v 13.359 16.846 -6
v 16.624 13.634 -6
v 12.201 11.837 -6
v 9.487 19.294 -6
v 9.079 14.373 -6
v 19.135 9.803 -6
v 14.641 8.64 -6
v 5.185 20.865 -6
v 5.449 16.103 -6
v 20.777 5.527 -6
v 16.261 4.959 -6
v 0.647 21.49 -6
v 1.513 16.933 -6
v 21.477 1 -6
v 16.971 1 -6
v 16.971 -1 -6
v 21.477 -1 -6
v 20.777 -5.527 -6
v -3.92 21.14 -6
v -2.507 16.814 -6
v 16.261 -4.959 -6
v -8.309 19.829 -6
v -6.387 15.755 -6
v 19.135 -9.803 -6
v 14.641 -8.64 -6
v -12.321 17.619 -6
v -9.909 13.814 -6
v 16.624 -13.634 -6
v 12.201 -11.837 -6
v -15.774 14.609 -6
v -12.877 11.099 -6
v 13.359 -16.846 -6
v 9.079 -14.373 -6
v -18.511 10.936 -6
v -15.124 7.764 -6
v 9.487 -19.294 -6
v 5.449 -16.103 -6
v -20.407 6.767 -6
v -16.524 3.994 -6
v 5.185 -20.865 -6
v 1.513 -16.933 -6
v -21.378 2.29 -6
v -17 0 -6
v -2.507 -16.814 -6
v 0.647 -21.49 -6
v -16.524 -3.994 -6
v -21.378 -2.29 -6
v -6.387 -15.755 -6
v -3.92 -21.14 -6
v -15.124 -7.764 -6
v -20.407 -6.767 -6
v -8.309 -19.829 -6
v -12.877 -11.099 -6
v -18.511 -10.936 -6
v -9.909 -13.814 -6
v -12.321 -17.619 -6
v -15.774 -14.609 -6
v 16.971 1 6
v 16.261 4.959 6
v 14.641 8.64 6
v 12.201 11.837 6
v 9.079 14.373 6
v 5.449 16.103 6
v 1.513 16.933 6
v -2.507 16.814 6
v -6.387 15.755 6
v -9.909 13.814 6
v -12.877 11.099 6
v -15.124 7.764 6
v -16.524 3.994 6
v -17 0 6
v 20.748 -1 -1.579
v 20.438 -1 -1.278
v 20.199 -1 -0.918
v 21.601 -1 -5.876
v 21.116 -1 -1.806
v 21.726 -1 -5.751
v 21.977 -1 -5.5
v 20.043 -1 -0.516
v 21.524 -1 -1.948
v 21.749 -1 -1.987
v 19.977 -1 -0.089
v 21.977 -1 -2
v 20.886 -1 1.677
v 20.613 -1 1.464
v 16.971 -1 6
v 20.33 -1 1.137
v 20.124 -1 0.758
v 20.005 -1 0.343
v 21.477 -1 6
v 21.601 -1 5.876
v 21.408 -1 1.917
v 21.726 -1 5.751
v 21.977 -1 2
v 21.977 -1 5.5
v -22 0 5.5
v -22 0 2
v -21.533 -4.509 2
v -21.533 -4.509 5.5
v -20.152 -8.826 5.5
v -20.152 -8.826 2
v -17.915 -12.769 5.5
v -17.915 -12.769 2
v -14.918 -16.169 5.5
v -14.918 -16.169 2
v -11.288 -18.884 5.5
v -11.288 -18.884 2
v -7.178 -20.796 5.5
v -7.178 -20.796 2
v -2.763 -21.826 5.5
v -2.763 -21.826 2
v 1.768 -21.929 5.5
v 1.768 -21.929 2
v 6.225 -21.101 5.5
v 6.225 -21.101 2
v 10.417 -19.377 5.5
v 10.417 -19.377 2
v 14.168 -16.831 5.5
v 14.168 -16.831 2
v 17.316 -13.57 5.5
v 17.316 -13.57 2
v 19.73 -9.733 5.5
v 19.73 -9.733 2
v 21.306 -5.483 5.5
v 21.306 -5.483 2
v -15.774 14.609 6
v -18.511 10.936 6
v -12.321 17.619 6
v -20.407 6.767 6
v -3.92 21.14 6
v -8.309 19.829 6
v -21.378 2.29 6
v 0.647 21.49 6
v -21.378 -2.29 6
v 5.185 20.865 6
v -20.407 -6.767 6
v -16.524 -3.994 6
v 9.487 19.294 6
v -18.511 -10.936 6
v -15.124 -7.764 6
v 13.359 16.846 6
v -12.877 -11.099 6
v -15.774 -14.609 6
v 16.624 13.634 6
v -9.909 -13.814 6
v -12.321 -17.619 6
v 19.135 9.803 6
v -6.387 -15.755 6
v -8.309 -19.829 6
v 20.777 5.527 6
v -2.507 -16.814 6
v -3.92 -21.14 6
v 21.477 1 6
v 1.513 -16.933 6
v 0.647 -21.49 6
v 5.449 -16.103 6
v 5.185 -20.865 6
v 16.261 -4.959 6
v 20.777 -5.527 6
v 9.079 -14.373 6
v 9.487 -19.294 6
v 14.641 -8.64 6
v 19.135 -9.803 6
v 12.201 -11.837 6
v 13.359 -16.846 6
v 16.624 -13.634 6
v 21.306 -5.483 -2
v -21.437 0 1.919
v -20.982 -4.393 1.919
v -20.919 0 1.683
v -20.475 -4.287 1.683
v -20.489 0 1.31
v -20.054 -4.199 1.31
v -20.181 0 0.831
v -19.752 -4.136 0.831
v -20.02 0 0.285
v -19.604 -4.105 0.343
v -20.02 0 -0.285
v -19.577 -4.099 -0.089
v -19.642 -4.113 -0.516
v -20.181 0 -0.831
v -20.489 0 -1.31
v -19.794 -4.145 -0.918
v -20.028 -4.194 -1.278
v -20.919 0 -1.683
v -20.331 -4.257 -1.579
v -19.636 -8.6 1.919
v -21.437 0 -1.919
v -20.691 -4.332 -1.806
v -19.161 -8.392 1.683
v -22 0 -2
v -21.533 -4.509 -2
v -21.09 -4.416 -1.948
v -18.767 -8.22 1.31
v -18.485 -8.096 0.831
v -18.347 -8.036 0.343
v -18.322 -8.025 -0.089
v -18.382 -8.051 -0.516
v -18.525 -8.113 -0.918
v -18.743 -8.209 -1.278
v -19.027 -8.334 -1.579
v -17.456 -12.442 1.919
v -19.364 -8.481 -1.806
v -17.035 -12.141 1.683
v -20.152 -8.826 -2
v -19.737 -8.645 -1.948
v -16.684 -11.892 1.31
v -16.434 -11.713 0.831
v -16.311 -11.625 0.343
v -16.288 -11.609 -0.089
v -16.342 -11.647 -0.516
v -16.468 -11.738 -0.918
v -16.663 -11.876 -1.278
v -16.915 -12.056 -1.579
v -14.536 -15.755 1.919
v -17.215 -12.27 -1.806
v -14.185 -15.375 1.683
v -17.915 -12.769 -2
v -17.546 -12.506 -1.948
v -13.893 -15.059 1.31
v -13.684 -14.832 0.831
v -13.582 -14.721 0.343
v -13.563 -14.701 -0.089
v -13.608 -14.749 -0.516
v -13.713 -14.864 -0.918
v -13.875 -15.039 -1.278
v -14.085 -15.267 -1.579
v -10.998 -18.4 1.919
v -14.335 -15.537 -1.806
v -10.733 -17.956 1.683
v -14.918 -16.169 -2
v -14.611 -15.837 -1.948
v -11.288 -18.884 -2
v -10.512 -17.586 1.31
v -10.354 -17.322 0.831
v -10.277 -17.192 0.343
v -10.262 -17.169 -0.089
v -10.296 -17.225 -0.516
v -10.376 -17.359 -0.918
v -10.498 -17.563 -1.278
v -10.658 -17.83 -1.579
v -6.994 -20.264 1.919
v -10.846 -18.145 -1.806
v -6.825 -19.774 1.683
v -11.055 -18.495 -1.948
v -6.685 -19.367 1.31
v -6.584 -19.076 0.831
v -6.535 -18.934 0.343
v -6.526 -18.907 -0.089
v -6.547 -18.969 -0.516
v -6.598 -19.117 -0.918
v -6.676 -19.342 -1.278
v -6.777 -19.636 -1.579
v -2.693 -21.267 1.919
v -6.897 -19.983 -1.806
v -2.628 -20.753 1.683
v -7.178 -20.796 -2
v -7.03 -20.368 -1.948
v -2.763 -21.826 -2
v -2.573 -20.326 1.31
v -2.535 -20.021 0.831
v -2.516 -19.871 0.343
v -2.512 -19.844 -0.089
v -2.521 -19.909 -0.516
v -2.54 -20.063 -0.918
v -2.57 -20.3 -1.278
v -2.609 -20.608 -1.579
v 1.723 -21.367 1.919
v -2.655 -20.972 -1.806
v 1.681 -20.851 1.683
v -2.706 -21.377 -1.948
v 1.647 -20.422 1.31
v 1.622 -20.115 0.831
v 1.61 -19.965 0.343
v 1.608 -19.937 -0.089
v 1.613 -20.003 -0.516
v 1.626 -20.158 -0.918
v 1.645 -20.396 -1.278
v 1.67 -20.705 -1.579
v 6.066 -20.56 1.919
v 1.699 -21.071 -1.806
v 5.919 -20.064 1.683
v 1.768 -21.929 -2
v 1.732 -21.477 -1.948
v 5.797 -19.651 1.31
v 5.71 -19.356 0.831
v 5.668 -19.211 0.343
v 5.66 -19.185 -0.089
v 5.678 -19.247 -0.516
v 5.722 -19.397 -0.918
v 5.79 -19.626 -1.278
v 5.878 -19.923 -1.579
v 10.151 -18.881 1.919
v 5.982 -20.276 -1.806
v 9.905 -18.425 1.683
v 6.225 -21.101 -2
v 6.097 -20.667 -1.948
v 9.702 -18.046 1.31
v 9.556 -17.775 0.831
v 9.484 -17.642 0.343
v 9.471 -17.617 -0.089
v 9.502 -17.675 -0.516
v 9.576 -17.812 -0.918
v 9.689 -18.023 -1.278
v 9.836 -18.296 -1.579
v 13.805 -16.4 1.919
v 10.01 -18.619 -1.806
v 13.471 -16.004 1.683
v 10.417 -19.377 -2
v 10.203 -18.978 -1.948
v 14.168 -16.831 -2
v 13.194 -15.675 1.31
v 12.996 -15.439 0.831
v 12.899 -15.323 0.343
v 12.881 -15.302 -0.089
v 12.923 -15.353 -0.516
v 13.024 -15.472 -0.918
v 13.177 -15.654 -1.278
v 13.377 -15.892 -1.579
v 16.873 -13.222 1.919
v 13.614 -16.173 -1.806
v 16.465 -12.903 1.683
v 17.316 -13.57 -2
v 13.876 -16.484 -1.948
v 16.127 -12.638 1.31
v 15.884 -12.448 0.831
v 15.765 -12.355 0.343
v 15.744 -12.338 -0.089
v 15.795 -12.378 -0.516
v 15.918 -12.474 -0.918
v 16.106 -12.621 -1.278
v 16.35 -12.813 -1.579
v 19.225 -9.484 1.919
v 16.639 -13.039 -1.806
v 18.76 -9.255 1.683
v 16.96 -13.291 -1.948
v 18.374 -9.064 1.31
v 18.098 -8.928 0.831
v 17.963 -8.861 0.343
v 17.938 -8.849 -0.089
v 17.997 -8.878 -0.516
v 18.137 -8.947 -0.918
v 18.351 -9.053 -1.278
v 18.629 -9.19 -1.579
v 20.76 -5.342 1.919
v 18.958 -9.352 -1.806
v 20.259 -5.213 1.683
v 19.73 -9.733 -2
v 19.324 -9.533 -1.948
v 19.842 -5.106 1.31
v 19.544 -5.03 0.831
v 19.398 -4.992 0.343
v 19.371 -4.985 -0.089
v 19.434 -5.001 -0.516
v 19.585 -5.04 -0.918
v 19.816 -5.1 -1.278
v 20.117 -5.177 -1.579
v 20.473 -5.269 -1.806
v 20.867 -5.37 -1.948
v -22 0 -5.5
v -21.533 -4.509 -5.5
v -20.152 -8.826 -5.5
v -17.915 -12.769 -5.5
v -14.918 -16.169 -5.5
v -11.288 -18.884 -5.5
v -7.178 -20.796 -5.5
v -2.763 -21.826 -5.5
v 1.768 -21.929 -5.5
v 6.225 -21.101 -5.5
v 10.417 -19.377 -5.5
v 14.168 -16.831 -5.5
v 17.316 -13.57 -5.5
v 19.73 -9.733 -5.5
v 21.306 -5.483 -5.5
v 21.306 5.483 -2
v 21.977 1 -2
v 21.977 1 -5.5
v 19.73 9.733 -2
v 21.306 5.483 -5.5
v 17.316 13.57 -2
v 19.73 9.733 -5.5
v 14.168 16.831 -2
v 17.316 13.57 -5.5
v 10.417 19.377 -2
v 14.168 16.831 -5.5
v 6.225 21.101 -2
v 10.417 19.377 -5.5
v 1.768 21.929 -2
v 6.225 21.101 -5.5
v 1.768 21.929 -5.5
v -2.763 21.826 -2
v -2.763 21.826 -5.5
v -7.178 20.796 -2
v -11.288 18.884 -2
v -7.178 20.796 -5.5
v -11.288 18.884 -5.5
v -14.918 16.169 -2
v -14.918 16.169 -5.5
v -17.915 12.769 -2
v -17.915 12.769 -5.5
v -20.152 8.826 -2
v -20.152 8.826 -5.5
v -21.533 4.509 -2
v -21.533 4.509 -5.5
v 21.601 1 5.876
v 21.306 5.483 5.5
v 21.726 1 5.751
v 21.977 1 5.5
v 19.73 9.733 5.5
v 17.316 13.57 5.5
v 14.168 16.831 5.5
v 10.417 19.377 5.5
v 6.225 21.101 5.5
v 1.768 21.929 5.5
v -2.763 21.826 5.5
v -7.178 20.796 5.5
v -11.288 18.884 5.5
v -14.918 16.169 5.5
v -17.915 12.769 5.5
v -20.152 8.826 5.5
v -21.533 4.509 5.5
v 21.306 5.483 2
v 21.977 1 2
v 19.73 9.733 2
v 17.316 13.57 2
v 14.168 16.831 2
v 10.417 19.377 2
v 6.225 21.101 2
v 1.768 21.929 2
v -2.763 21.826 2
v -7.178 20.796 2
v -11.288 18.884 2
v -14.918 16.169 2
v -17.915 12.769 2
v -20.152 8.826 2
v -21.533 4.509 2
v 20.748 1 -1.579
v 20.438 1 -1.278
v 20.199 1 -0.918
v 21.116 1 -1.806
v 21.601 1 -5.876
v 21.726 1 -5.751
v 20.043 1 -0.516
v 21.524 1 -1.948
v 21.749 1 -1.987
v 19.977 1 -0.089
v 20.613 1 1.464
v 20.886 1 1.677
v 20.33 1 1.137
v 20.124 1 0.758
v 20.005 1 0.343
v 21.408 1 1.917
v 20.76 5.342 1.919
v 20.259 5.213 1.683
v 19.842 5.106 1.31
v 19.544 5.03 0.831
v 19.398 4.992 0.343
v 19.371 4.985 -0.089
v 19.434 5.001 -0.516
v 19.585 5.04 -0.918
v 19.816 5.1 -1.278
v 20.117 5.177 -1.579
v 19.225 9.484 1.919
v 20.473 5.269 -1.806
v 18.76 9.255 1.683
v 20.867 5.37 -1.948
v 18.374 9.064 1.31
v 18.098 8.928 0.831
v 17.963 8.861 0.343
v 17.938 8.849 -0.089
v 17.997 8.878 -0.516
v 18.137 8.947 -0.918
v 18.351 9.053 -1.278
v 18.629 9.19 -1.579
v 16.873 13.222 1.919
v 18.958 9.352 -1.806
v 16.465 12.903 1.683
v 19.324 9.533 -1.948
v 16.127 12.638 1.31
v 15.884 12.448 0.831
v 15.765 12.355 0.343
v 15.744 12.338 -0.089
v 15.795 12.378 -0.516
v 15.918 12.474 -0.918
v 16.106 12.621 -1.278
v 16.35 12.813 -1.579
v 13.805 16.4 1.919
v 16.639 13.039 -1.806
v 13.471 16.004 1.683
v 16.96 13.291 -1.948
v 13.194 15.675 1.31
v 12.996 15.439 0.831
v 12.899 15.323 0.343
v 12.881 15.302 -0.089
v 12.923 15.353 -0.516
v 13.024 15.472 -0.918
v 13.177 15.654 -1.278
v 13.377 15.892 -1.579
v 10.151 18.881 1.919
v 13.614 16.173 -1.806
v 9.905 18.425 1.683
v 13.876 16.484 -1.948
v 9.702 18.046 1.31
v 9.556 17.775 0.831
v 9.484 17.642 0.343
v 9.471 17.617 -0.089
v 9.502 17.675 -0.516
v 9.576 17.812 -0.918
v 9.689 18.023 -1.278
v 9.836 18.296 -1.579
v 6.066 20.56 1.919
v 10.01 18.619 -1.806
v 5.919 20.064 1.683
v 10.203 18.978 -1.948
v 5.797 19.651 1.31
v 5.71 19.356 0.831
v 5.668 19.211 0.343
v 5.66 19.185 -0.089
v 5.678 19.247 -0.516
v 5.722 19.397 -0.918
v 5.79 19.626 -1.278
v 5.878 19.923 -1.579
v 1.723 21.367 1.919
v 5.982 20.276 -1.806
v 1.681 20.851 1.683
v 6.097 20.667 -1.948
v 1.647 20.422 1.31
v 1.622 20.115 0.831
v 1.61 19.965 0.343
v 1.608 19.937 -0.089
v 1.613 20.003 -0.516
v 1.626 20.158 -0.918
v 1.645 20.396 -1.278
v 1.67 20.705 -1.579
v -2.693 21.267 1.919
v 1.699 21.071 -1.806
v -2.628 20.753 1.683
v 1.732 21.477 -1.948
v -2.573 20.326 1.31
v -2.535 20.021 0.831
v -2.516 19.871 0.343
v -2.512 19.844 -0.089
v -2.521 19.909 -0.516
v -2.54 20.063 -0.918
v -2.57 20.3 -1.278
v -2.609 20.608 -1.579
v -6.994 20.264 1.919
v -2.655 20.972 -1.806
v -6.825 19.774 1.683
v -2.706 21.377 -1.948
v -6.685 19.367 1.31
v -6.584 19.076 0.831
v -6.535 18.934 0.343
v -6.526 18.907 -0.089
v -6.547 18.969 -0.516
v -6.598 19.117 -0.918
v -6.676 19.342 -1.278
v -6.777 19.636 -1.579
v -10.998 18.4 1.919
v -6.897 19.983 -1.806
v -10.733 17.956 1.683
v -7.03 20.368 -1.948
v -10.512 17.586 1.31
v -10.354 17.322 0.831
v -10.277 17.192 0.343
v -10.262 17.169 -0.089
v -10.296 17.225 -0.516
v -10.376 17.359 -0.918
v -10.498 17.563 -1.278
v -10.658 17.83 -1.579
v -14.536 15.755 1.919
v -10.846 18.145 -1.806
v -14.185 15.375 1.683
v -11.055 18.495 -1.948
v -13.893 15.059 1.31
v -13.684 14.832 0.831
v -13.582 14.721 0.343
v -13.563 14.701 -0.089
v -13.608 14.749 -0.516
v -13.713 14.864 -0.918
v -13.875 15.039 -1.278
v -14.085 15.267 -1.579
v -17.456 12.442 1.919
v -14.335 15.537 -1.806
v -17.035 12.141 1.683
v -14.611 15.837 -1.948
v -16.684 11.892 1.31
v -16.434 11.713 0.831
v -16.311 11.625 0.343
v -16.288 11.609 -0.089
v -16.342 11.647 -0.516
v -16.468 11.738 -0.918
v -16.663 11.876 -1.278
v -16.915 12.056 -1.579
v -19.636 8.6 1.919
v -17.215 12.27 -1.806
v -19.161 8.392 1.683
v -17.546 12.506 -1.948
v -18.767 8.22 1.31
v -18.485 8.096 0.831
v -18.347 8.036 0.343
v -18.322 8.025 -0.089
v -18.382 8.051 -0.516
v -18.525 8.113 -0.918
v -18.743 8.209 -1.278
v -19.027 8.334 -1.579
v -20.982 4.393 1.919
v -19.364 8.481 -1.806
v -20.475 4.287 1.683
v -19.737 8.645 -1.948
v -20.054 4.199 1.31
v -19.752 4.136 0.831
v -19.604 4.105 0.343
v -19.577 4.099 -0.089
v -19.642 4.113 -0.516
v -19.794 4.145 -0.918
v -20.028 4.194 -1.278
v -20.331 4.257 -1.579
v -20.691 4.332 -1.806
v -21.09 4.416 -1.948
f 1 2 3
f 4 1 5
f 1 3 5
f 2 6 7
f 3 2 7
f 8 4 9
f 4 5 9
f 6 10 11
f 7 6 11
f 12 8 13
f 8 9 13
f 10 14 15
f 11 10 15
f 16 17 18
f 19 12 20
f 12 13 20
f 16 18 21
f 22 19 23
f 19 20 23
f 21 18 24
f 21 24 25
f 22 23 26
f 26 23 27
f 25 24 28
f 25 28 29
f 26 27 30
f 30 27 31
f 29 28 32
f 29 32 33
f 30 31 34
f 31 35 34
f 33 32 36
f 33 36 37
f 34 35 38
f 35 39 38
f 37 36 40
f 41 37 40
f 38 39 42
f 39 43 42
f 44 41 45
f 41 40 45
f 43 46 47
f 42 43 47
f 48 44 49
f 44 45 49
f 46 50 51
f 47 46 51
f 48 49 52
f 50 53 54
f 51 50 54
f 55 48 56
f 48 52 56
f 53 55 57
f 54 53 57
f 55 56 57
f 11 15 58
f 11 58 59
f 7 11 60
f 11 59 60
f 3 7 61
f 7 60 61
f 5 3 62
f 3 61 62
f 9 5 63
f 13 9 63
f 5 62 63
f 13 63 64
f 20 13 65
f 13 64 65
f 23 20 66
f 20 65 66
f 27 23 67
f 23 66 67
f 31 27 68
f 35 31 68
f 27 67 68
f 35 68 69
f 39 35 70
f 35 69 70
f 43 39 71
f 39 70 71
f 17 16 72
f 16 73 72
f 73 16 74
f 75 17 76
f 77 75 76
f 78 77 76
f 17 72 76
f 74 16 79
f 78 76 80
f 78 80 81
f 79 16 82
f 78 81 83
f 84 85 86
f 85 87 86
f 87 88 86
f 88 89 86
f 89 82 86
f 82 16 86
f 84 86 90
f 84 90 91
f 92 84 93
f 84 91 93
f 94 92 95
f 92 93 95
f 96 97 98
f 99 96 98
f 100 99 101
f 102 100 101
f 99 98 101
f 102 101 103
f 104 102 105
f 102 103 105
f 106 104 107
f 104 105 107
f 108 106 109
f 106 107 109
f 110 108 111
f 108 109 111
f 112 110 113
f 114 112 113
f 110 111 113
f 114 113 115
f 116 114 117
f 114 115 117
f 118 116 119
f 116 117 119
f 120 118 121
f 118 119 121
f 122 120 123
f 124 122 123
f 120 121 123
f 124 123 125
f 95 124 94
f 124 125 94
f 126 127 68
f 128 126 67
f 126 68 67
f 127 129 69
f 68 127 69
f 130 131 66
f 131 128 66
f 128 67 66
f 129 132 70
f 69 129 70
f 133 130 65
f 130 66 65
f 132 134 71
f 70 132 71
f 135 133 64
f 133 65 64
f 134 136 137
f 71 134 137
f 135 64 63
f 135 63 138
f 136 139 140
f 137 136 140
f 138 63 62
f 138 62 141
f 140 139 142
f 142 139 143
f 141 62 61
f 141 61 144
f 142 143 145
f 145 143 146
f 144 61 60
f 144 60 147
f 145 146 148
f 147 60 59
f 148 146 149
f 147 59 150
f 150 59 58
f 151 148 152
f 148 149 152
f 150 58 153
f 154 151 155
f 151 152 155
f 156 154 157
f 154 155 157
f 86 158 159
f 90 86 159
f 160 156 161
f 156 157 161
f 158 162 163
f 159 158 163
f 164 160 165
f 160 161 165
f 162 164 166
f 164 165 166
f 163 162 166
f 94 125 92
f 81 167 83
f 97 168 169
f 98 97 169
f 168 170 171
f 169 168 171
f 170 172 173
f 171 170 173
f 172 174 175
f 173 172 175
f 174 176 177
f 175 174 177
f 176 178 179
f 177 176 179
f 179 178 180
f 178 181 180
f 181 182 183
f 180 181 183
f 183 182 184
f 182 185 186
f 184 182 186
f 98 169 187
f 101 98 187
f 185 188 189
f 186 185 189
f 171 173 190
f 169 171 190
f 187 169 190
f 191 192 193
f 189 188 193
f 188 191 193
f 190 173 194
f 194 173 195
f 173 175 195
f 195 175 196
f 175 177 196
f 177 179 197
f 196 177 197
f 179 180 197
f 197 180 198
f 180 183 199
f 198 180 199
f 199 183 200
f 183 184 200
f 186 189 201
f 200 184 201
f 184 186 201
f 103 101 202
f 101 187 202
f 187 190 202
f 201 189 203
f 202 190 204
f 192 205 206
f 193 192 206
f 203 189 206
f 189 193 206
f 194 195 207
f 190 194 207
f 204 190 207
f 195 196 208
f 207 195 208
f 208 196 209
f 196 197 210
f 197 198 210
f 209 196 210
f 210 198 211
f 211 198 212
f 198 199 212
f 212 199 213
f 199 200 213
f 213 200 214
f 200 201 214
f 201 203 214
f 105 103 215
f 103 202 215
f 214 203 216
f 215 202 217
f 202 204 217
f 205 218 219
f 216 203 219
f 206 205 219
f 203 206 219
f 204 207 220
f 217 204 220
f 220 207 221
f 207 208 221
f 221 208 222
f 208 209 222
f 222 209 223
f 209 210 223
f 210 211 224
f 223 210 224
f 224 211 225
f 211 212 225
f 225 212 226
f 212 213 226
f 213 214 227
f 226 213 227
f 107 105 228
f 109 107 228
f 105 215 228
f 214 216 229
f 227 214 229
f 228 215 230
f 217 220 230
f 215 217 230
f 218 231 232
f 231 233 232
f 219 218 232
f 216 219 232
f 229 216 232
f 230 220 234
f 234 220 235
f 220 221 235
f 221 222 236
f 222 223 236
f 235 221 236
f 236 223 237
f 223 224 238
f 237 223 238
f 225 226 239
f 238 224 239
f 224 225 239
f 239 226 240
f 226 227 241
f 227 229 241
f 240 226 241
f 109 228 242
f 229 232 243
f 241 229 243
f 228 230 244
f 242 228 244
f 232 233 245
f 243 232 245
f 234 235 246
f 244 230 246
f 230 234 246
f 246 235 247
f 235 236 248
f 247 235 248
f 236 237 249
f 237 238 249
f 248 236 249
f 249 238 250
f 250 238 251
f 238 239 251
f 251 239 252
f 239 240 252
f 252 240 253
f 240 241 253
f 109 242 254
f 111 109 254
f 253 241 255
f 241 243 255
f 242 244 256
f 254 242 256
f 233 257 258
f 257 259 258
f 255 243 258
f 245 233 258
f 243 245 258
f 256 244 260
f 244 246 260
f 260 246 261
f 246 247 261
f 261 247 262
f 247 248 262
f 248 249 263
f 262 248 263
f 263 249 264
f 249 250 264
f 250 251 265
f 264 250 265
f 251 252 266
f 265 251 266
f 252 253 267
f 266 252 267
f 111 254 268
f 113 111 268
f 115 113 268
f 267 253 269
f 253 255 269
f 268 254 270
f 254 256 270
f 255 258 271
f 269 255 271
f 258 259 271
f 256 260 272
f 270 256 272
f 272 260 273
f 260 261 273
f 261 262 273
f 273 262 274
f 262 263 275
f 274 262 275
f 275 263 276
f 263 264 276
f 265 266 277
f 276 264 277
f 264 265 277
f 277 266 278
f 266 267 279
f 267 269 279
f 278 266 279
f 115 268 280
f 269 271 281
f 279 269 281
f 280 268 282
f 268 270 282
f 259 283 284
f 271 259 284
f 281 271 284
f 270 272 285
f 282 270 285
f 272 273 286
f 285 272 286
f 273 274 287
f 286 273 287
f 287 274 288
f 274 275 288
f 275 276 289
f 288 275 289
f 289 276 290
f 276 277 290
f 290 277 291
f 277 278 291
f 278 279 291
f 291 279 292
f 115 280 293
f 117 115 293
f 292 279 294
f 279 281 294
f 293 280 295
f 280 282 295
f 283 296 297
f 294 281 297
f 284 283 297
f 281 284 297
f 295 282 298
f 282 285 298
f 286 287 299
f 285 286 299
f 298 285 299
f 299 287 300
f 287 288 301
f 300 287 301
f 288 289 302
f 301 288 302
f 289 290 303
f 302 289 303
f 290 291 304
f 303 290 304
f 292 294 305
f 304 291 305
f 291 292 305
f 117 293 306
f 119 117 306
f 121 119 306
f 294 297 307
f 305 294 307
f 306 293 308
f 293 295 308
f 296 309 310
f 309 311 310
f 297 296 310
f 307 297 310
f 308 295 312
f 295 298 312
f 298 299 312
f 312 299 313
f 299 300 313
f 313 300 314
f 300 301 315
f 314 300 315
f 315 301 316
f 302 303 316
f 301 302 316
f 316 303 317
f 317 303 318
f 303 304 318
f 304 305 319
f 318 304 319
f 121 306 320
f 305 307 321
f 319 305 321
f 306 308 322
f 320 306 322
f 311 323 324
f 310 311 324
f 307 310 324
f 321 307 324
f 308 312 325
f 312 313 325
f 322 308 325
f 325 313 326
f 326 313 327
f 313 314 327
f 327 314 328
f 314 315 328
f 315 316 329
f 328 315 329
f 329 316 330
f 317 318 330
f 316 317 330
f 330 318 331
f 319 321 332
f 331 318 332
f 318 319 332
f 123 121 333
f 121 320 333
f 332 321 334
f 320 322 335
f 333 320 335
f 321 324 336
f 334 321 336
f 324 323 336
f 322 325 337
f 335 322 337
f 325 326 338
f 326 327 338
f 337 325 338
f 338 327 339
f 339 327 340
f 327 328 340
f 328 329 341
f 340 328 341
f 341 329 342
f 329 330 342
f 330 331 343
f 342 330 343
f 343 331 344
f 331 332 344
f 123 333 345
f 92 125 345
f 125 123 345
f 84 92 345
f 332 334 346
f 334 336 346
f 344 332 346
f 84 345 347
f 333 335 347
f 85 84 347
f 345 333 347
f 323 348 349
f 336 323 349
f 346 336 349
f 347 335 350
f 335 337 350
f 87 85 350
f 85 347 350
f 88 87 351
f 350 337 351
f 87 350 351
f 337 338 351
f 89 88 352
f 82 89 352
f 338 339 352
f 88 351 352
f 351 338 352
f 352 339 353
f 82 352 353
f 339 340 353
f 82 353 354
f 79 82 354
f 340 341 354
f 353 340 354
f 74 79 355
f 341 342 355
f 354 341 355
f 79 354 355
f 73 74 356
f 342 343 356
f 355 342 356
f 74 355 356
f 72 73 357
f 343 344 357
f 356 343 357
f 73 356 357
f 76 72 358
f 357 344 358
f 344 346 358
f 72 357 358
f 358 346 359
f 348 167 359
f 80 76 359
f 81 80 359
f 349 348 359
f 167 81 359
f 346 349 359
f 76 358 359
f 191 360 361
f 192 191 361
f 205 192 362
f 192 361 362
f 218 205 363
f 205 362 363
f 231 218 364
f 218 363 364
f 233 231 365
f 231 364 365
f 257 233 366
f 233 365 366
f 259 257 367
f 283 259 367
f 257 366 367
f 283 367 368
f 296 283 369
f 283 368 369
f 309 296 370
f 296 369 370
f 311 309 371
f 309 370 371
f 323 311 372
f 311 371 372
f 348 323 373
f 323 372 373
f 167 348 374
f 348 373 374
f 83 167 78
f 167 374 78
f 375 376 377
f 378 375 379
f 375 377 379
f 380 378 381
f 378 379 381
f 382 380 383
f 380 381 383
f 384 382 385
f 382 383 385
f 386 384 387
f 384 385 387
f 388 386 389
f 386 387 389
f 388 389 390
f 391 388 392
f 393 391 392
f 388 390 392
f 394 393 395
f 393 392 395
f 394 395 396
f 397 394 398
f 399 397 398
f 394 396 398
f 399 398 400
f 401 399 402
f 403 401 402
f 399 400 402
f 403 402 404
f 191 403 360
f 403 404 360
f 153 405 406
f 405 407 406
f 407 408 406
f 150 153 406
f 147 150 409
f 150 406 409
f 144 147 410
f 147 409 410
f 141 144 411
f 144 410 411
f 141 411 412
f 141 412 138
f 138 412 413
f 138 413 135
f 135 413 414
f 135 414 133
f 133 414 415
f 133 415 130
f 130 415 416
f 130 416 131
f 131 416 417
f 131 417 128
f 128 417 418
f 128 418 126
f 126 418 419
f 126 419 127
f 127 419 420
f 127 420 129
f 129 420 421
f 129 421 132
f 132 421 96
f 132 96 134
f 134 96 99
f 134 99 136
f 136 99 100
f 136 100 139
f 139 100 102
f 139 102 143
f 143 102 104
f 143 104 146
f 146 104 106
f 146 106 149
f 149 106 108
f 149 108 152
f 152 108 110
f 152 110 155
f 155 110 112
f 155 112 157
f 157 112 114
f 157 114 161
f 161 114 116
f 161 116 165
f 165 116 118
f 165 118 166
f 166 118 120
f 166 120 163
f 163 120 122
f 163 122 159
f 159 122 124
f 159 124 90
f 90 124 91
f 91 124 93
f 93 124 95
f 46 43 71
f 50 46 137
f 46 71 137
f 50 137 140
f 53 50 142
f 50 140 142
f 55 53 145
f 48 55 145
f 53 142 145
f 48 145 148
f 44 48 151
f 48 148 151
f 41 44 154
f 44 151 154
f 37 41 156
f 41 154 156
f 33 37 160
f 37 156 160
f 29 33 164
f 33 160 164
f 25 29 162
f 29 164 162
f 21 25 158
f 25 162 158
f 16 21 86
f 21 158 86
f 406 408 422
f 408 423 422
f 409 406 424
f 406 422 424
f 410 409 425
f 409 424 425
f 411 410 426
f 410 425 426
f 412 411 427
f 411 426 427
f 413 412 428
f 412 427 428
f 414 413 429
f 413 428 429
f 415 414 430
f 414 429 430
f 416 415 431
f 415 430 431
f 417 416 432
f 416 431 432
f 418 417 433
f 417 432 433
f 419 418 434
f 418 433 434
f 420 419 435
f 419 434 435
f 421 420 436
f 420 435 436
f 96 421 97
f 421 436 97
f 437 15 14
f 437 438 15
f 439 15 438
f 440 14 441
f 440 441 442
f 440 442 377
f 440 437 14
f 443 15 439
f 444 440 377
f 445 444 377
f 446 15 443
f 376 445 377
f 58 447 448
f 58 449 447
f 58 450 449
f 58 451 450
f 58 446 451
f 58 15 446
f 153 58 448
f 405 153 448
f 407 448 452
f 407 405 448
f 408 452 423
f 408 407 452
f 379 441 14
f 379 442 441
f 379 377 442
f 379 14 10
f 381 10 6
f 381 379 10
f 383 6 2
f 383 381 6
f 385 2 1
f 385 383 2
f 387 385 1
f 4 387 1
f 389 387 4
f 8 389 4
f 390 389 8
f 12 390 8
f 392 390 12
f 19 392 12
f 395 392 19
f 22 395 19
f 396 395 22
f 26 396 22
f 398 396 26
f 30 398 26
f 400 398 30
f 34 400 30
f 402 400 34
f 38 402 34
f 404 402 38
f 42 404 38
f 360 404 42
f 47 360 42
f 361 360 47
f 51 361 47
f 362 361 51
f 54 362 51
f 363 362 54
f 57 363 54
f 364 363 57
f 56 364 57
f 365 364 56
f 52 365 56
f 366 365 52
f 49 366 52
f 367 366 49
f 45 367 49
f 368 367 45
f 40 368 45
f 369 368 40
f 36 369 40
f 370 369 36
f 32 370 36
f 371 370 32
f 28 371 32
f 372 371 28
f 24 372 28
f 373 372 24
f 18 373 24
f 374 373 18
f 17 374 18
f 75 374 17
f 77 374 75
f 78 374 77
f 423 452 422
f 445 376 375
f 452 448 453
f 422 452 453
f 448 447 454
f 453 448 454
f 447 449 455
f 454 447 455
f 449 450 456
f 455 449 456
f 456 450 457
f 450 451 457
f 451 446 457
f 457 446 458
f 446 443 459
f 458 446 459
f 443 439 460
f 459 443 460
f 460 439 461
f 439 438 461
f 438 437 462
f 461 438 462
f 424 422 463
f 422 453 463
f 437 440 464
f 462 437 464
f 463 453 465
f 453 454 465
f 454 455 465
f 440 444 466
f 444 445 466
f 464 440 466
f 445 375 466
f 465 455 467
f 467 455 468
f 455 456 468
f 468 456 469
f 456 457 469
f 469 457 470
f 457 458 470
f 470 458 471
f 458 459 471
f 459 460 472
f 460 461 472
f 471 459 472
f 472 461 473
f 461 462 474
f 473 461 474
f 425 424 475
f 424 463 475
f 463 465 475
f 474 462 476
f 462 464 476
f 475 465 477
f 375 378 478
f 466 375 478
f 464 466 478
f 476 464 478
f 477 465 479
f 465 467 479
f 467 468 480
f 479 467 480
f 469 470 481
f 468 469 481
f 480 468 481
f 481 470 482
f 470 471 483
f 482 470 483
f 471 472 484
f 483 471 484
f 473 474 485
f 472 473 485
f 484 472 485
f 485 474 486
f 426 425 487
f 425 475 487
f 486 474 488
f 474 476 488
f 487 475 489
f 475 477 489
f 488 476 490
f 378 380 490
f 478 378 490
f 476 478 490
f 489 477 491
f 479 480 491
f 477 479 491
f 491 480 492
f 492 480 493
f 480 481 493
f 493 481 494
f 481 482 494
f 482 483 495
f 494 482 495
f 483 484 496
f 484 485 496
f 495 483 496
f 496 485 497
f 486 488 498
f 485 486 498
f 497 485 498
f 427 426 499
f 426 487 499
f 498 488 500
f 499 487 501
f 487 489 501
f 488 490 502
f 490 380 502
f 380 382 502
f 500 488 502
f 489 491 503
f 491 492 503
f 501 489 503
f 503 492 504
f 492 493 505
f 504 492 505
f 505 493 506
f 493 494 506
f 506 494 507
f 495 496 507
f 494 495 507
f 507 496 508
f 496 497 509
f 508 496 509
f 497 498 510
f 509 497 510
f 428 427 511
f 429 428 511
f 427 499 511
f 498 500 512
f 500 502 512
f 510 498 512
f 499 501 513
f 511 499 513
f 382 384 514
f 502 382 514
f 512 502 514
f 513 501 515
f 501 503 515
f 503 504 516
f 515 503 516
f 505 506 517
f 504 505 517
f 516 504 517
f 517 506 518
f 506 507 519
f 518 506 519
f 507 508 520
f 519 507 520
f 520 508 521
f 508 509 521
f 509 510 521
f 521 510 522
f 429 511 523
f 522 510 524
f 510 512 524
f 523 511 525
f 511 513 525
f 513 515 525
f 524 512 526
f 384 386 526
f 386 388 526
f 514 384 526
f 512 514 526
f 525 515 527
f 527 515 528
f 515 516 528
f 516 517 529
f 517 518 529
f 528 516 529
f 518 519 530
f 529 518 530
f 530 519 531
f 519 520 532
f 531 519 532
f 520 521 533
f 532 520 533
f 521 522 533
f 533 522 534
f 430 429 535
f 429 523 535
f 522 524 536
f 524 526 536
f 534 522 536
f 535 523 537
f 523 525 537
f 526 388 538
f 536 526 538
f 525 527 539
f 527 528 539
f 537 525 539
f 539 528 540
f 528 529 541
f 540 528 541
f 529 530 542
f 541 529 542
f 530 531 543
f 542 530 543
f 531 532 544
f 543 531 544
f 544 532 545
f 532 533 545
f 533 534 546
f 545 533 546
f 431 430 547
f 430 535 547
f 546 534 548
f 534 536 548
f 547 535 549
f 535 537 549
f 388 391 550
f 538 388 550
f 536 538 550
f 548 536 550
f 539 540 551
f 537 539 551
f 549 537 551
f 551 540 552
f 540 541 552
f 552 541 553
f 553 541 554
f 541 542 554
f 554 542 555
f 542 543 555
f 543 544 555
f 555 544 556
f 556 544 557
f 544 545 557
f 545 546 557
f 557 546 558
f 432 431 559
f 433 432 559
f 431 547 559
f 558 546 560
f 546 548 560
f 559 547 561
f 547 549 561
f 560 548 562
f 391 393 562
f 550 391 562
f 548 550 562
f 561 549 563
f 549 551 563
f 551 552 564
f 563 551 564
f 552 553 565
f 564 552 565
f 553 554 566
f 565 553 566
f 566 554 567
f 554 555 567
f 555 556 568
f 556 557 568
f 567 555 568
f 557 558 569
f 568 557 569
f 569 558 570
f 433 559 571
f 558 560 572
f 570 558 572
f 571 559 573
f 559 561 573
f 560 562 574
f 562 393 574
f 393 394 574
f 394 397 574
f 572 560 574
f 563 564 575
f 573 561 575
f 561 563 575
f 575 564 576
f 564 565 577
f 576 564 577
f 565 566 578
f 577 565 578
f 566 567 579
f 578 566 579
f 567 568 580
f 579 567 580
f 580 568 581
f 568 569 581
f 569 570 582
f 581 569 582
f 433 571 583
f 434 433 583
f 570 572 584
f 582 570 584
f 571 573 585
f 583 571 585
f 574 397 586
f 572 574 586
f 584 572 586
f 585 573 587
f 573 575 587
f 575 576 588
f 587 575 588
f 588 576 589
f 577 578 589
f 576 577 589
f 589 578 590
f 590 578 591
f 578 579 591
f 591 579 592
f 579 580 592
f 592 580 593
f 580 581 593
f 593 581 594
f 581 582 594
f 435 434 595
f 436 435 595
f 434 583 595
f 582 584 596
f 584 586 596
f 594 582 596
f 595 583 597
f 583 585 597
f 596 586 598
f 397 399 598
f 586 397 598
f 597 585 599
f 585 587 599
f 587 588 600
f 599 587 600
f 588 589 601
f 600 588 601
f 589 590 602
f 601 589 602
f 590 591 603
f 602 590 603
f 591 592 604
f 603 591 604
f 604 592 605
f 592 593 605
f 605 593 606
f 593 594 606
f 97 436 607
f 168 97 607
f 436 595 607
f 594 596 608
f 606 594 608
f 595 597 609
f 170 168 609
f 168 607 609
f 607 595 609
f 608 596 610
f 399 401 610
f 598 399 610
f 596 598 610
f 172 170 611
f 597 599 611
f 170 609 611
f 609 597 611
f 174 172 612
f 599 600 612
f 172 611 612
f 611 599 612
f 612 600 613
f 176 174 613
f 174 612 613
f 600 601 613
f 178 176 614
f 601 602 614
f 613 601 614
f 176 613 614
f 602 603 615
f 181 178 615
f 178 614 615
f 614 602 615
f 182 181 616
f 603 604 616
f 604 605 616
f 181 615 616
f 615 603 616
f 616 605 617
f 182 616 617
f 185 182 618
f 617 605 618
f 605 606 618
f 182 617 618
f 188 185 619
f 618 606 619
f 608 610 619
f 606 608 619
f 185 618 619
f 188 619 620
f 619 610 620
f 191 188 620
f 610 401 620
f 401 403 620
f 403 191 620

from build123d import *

# Parameters (mm, degrees)
F2_W     = 10
F2_H     = 2
F3_DEPTH = 12.5
F4_SIZE  = 0.5


with BuildPart() as f1:
    # F0 (on Front) → F1 (revolve)
    with BuildSketch(Plane.XZ):
        with BuildLine():
            Line((-17, -6), (-17, 0))
            Line((-17, 0), (-17, 6))
            Line((-17, 6), (-22, 6))
            Line((-22, 6), (-22, 2))
            ThreePointArc((-22, 2), (-20, 0), (-22, -2))
            Line((-22, -2), (-22, -6))
            Line((-22, -6), (-17, -6))
        make_face()
    revolve(axis=Axis((0, 0, 3.54172), (0, 0, 1)))

    # F2 (on Top) → F3 (cut, symmetric)
    with BuildSketch(Plane.XY):
        with Locations((20, 0)):
            Rectangle(F2_W, F2_H)
    extrude(amount=F3_DEPTH, both=True, mode=Mode.SUBTRACT)

    # F4
    f4_edges = [f1.edges().sort_by_distance(p)[0] for p in [
        (-0.500129, -21.994315, -6),
        (-0.500129, -21.994315, 6),
    ]]
    chamfer(f4_edges, length=F4_SIZE)


solid = f1.part
